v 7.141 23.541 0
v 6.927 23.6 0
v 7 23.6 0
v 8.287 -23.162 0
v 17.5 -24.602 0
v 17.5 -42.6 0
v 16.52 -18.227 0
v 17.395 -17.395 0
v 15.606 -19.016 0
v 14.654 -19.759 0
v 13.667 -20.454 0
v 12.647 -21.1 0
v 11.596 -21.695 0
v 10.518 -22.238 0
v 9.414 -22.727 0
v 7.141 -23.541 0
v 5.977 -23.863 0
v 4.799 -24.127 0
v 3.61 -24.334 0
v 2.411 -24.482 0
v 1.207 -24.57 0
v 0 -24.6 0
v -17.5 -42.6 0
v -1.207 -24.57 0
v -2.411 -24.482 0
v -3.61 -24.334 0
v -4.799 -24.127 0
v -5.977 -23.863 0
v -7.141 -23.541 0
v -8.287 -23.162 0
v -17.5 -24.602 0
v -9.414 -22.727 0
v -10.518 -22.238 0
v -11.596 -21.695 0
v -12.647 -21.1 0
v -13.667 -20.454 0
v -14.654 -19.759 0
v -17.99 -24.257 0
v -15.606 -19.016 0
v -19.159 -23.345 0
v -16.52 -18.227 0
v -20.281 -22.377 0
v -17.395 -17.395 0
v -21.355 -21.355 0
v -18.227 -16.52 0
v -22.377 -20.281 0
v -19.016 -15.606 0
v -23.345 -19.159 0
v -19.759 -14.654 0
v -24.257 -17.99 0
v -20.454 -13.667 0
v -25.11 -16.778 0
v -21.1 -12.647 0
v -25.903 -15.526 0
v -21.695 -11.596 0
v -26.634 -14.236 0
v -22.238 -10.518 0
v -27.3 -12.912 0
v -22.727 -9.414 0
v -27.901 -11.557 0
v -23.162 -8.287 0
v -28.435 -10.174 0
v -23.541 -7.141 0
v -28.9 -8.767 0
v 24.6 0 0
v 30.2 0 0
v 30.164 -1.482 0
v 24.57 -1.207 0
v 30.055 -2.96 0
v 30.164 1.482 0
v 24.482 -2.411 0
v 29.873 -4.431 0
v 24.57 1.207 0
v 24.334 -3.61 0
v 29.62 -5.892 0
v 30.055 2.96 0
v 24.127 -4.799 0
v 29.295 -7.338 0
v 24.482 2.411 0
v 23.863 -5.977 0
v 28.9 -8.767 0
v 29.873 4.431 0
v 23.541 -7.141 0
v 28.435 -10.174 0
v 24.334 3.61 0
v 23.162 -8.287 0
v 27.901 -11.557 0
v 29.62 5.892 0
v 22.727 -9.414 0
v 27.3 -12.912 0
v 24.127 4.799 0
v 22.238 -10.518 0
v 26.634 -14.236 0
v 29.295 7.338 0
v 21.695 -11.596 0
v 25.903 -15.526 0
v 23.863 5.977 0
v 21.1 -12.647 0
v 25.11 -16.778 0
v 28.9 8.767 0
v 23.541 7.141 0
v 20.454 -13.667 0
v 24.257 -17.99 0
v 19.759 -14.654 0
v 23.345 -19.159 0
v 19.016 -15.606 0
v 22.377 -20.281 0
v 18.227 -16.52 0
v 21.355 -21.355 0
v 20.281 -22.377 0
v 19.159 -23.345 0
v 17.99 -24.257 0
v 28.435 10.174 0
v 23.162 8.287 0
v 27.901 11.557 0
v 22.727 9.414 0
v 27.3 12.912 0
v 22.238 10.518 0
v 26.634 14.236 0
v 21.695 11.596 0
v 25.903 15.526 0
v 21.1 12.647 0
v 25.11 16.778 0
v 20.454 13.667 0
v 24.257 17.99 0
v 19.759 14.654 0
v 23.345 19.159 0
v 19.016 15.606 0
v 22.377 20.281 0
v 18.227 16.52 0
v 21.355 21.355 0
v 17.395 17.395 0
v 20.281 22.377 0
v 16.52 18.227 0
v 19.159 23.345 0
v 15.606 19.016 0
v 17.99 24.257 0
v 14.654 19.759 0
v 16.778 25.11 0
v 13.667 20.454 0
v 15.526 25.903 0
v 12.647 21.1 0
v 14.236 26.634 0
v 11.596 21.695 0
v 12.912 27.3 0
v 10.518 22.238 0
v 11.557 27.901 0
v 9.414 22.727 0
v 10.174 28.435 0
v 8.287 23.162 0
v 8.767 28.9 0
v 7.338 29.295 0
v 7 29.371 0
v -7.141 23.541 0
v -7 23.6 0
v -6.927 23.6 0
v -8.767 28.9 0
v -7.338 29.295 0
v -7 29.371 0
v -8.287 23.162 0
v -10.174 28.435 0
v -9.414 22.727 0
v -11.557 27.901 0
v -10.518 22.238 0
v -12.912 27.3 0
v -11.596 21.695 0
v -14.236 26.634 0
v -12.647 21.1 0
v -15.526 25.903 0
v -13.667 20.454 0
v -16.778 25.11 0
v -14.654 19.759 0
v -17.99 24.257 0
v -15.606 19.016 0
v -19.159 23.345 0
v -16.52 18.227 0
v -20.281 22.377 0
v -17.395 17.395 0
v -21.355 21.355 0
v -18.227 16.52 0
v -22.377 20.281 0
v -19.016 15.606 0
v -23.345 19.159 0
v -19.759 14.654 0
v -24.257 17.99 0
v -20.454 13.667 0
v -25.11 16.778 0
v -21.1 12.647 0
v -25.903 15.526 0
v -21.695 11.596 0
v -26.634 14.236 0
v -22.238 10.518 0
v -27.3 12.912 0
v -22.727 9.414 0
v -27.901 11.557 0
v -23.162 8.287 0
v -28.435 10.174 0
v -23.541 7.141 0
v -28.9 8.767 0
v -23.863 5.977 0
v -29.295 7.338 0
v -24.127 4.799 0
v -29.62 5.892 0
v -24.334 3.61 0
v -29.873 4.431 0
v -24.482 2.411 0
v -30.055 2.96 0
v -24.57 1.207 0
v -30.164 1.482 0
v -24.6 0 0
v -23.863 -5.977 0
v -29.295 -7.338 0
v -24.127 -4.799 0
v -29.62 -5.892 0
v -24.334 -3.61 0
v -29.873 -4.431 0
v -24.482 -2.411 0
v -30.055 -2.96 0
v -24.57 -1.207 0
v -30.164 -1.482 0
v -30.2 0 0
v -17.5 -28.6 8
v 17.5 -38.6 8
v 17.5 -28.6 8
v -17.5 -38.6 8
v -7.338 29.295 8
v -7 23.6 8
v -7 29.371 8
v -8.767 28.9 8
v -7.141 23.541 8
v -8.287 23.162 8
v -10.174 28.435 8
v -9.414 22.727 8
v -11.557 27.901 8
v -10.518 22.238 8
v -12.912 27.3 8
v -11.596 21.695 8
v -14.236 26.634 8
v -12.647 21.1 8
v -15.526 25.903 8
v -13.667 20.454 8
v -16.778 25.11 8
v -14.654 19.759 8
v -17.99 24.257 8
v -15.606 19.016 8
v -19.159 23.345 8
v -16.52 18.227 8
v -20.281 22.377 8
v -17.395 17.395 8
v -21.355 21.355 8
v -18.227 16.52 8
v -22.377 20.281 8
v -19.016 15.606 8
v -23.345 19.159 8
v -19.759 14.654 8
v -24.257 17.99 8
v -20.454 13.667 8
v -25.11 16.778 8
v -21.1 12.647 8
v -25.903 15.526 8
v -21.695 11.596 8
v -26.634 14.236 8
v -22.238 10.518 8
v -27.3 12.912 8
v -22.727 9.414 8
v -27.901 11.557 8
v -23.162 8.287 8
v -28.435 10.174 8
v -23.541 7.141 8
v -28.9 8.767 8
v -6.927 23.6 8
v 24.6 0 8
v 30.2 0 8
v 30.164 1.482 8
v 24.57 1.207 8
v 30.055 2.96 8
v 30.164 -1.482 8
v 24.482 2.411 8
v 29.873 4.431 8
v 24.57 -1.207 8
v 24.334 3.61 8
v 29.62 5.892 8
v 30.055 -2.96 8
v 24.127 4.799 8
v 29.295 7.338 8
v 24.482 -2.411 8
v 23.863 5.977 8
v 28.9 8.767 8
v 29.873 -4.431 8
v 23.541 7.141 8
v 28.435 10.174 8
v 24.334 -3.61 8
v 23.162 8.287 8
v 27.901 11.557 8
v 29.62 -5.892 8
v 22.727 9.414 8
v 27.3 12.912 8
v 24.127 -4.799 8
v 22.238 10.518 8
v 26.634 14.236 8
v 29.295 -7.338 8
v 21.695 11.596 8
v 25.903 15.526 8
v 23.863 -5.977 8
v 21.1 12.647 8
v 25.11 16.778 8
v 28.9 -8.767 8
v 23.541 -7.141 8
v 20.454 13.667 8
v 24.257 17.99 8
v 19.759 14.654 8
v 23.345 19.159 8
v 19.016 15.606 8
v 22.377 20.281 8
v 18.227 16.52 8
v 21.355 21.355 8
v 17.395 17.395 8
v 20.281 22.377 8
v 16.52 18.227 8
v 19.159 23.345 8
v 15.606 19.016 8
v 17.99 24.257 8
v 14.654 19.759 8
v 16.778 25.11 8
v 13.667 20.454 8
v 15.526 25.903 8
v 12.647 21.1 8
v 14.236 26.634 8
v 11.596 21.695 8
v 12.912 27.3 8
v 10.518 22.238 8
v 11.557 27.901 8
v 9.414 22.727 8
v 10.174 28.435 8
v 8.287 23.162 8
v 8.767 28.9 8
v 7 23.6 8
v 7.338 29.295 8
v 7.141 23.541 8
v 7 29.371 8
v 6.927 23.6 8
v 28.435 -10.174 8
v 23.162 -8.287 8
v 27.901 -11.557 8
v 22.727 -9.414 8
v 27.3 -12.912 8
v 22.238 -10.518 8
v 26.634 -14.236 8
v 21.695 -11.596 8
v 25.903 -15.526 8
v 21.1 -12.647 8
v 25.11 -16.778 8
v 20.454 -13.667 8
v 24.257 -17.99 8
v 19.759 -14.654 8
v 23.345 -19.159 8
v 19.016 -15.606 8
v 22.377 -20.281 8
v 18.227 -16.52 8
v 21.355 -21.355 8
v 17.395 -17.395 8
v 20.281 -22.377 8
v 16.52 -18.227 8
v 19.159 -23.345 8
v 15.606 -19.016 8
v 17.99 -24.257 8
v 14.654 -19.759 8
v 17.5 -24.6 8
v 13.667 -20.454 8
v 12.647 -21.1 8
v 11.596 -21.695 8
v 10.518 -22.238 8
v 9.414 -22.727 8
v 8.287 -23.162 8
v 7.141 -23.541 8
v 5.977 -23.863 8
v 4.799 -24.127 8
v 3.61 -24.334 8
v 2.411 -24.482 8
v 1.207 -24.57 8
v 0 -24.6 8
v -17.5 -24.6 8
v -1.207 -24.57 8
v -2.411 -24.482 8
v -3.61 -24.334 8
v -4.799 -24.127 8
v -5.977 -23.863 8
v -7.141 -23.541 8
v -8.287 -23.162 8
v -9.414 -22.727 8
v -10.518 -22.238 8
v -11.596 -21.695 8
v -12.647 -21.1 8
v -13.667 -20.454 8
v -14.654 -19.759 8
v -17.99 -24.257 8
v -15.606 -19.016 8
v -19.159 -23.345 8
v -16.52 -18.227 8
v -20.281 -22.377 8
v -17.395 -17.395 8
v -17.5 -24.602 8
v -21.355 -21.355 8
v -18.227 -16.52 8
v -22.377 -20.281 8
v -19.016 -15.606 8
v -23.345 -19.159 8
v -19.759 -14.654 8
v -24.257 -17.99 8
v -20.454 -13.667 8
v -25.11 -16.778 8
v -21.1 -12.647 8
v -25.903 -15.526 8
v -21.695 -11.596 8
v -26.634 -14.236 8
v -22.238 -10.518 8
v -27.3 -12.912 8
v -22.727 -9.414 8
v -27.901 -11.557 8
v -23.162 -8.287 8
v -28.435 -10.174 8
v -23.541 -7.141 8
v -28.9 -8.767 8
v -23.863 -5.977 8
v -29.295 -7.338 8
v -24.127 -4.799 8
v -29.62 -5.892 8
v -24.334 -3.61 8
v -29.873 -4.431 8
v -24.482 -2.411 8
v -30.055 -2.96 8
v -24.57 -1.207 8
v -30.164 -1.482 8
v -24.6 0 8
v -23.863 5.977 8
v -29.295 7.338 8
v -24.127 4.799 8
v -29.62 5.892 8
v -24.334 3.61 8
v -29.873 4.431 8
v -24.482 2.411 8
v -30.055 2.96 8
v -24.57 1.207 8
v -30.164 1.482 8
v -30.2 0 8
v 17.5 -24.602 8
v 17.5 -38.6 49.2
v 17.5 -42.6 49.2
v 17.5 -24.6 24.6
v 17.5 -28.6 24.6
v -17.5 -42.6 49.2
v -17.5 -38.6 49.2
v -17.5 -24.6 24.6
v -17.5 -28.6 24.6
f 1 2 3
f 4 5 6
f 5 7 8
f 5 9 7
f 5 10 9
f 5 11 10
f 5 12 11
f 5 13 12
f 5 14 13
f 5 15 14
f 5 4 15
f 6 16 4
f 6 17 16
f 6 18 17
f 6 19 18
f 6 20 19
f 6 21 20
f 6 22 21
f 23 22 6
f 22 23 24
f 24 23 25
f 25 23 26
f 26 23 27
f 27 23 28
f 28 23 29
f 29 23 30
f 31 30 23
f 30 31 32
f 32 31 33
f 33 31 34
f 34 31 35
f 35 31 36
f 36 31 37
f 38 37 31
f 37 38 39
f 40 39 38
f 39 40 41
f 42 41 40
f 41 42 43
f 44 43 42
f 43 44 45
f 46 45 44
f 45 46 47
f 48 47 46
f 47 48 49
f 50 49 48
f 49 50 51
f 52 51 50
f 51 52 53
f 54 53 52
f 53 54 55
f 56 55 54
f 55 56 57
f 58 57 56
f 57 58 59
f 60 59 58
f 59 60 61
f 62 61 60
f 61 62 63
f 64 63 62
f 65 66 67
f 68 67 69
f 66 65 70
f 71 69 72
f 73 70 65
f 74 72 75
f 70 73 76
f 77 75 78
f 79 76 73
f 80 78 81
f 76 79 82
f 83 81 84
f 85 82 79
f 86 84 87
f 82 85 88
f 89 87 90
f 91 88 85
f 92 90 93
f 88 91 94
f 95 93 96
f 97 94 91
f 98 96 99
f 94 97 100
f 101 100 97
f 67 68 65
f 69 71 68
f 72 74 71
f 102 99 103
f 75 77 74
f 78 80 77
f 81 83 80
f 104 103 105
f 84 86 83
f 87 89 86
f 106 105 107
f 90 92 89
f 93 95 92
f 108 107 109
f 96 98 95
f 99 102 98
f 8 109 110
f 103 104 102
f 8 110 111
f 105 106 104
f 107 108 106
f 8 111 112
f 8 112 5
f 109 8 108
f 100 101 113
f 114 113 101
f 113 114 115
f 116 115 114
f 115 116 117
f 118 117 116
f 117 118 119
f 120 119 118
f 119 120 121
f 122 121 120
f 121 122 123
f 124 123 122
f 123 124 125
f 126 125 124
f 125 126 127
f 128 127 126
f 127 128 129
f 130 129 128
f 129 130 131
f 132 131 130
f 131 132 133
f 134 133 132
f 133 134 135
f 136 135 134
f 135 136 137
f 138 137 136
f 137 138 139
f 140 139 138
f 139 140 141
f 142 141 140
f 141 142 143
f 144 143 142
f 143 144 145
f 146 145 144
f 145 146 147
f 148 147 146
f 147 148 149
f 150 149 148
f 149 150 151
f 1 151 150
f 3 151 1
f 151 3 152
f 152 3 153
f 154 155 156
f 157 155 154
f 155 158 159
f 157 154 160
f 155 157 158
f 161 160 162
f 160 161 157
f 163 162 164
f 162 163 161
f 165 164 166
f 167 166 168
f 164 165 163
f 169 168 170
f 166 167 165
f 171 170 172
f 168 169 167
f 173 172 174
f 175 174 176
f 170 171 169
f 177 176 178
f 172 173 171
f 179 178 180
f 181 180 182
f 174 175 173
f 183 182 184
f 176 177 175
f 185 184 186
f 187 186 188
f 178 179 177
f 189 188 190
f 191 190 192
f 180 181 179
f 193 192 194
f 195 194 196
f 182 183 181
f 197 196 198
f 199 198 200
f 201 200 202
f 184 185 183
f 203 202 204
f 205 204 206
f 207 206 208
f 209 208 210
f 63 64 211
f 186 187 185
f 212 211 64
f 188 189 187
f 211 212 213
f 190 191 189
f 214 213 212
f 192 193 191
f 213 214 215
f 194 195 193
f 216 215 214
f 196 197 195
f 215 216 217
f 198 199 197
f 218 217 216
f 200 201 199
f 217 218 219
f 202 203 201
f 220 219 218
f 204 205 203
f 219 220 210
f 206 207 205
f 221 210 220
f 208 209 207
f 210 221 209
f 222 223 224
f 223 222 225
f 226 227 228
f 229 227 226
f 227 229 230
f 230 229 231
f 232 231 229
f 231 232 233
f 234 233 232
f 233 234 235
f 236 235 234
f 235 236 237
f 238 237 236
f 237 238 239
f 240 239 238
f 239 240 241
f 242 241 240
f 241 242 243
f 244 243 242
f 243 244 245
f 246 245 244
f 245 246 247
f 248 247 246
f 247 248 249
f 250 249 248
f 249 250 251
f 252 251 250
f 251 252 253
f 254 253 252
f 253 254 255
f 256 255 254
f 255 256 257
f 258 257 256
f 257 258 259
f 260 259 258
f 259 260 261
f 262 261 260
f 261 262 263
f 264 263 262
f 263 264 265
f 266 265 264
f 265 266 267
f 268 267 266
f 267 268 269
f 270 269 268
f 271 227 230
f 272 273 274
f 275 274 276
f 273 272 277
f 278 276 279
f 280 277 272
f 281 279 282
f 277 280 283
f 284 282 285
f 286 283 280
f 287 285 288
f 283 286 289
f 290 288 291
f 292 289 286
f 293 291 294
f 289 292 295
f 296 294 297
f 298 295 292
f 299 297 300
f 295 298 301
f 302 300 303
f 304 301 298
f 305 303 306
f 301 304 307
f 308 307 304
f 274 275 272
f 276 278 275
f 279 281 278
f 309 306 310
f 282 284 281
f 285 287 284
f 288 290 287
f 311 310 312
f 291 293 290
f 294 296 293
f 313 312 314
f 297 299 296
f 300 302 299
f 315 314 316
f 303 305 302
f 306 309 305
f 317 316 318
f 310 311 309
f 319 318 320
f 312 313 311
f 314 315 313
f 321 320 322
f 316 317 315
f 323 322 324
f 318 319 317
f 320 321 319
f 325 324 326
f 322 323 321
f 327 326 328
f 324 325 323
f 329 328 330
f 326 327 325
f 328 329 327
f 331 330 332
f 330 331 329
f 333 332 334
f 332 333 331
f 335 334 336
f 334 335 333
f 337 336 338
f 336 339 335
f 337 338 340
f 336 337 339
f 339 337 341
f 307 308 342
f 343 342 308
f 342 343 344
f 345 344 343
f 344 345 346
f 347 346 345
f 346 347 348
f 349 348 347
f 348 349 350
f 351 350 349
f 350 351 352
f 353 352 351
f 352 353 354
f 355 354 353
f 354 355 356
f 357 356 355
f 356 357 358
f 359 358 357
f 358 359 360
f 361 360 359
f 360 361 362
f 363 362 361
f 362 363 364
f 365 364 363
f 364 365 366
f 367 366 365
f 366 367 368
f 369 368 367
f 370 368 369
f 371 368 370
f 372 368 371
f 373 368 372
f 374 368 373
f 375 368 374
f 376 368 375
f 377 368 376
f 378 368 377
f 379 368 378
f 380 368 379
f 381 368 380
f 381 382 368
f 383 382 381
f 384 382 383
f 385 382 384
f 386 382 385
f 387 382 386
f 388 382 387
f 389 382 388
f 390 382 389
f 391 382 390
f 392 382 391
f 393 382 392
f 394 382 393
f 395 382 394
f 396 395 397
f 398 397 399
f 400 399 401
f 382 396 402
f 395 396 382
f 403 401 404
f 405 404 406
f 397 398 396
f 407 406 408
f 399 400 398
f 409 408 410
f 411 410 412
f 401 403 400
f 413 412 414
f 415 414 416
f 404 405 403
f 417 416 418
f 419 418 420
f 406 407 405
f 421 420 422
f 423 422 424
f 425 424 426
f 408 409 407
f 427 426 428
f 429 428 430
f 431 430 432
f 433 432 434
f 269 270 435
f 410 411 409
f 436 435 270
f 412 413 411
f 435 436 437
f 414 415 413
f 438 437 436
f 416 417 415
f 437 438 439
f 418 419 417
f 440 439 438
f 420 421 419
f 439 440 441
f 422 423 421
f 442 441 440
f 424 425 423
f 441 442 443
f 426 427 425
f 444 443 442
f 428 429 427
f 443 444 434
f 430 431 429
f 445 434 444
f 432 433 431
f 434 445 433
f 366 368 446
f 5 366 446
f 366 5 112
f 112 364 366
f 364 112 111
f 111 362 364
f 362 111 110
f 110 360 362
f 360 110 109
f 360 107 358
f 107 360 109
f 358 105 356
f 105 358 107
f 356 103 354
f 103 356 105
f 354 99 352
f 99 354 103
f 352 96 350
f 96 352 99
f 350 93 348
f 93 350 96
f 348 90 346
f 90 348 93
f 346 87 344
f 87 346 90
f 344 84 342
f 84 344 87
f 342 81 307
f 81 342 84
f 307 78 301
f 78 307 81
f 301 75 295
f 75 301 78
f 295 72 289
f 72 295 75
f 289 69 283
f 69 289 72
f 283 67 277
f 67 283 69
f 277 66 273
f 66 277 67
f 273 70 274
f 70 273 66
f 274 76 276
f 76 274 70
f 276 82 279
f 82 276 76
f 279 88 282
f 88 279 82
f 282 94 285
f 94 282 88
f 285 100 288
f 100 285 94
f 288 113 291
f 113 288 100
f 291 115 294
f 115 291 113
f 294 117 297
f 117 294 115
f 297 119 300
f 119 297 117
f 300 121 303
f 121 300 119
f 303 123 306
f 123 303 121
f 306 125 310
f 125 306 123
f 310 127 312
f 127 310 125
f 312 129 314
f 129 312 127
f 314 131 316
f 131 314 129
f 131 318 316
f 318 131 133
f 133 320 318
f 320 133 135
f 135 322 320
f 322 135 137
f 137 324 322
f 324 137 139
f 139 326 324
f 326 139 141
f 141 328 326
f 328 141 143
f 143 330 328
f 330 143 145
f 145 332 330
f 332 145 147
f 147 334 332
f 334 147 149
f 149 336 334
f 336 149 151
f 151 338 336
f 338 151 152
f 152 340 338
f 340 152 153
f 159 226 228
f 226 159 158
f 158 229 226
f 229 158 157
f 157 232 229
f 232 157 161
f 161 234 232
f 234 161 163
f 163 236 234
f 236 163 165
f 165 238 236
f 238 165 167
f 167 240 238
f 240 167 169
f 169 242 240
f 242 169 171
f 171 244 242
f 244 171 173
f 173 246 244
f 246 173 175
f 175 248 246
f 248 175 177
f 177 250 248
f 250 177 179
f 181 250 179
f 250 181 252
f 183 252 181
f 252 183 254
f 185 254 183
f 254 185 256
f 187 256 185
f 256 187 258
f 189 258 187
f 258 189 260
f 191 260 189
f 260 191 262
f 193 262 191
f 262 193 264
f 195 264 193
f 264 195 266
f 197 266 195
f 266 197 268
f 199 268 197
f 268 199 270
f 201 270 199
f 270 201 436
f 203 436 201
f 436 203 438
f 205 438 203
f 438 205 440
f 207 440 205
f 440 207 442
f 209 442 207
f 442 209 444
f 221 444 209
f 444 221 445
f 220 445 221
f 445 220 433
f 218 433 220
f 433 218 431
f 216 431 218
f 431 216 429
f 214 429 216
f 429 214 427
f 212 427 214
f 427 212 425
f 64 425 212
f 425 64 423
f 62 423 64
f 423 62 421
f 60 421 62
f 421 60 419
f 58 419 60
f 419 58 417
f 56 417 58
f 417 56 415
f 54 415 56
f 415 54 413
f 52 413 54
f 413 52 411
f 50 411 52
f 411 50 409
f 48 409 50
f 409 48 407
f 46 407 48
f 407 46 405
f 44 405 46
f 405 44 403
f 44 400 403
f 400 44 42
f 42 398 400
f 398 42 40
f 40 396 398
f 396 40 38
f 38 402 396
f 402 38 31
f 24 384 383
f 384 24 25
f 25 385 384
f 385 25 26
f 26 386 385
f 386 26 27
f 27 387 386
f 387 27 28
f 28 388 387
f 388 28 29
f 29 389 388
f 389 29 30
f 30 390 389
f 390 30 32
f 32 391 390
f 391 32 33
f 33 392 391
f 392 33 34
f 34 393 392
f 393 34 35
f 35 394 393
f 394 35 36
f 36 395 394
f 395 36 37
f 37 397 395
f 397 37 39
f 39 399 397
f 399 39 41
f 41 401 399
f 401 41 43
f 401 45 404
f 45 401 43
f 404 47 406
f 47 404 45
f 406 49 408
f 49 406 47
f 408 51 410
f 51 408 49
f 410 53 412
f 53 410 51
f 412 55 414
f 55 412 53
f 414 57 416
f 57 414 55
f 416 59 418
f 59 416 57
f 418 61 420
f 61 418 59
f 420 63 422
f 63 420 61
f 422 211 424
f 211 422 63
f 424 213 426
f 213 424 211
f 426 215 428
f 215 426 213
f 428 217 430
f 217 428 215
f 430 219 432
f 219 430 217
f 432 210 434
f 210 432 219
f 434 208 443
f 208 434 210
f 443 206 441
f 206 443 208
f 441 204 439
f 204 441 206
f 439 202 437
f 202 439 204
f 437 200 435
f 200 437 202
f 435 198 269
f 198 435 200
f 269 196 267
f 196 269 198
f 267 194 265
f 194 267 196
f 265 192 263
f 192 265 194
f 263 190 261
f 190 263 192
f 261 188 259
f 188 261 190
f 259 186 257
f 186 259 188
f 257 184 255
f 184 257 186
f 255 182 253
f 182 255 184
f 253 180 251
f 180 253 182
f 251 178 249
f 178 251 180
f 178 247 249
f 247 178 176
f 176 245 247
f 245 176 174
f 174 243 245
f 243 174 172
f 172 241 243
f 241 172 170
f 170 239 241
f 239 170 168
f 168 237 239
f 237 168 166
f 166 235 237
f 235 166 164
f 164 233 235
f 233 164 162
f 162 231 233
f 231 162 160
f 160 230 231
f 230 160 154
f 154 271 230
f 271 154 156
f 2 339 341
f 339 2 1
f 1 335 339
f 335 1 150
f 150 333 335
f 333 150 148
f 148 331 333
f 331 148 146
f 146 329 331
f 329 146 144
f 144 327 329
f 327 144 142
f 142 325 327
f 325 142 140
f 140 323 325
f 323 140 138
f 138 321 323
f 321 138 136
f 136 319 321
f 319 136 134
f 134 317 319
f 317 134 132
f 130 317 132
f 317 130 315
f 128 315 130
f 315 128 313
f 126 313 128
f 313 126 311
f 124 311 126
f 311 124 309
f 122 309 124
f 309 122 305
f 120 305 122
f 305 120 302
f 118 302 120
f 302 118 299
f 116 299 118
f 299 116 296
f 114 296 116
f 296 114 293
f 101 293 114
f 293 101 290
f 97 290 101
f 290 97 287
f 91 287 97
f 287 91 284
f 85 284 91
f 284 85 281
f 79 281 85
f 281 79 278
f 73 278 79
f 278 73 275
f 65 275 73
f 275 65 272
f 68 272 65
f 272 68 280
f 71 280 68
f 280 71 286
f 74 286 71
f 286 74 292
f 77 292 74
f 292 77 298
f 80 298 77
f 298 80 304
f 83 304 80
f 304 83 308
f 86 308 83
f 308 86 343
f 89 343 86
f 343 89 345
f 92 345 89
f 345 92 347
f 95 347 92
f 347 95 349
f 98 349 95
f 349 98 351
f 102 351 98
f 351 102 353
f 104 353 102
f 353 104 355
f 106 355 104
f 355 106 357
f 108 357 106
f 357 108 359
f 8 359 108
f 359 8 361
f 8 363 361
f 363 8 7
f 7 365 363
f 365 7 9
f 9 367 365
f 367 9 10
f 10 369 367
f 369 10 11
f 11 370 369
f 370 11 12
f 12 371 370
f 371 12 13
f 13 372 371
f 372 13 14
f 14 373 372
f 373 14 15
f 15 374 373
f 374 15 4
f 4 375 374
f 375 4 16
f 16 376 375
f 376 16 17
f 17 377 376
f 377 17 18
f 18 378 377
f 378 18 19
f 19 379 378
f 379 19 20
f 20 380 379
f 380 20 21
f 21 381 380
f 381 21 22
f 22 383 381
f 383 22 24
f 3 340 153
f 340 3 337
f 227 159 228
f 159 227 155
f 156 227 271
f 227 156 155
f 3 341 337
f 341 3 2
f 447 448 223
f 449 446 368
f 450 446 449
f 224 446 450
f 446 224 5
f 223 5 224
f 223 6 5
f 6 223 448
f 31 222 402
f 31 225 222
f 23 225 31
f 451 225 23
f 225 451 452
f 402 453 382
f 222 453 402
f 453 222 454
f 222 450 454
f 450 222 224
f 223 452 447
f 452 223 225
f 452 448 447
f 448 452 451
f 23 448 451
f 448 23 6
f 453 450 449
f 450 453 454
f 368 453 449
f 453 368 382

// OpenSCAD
baseheight = 8;

circlesegments = 128;

outerradius = 30.2;//60.4 mm
innerradius = 24.6;//48.4 mm + 0,8 Toleranz = 49.2

holderwidth = 35;
holderdepth = 10;
holderheight = innerradius*2;

holderthickness = 4.0;

ringspacewidth = 14;

difference()
{
    linear_extrude(height = baseheight)
    difference() {
        circle(outerradius, $fn=circlesegments);
        circle(innerradius, $fn=circlesegments);
    }
    
    translate([-ringspacewidth/2,innerradius-1,0])
    cube([ringspacewidth,outerradius-innerradius+2,baseheight]);
}

translate([-holderwidth/2,-innerradius-holderdepth-holderthickness,0]) //[Hälfte der Grundplatte (dann ist es mittig), -24.4-10, 0)
{       
    cube([holderwidth,holderdepth,baseheight]); //35 (gerade so breit, dass es bündig mit dem Kreis ist), 11 ist die reine Standfläche, 8 = so hoch wie der Kreis
    
    //vordere Platte
    translate([0,-holderthickness,0])
    cube([holderwidth,holderthickness,holderheight]); //48 = ~Hälfte vom S7 (40) + 8 von der Basisplatte => nehmen wir 48.4 dann haben wir exakt den Durchmesser vom inneren Kreis, -3.6 translate => Wände außerhalb, damit wir unsere volle Standfläche von 11 bekommen
    
    //hintere Platte am Holm
    translate([0,holderdepth,0])
    cube([holderwidth,holderthickness,holderheight/2]);
}
